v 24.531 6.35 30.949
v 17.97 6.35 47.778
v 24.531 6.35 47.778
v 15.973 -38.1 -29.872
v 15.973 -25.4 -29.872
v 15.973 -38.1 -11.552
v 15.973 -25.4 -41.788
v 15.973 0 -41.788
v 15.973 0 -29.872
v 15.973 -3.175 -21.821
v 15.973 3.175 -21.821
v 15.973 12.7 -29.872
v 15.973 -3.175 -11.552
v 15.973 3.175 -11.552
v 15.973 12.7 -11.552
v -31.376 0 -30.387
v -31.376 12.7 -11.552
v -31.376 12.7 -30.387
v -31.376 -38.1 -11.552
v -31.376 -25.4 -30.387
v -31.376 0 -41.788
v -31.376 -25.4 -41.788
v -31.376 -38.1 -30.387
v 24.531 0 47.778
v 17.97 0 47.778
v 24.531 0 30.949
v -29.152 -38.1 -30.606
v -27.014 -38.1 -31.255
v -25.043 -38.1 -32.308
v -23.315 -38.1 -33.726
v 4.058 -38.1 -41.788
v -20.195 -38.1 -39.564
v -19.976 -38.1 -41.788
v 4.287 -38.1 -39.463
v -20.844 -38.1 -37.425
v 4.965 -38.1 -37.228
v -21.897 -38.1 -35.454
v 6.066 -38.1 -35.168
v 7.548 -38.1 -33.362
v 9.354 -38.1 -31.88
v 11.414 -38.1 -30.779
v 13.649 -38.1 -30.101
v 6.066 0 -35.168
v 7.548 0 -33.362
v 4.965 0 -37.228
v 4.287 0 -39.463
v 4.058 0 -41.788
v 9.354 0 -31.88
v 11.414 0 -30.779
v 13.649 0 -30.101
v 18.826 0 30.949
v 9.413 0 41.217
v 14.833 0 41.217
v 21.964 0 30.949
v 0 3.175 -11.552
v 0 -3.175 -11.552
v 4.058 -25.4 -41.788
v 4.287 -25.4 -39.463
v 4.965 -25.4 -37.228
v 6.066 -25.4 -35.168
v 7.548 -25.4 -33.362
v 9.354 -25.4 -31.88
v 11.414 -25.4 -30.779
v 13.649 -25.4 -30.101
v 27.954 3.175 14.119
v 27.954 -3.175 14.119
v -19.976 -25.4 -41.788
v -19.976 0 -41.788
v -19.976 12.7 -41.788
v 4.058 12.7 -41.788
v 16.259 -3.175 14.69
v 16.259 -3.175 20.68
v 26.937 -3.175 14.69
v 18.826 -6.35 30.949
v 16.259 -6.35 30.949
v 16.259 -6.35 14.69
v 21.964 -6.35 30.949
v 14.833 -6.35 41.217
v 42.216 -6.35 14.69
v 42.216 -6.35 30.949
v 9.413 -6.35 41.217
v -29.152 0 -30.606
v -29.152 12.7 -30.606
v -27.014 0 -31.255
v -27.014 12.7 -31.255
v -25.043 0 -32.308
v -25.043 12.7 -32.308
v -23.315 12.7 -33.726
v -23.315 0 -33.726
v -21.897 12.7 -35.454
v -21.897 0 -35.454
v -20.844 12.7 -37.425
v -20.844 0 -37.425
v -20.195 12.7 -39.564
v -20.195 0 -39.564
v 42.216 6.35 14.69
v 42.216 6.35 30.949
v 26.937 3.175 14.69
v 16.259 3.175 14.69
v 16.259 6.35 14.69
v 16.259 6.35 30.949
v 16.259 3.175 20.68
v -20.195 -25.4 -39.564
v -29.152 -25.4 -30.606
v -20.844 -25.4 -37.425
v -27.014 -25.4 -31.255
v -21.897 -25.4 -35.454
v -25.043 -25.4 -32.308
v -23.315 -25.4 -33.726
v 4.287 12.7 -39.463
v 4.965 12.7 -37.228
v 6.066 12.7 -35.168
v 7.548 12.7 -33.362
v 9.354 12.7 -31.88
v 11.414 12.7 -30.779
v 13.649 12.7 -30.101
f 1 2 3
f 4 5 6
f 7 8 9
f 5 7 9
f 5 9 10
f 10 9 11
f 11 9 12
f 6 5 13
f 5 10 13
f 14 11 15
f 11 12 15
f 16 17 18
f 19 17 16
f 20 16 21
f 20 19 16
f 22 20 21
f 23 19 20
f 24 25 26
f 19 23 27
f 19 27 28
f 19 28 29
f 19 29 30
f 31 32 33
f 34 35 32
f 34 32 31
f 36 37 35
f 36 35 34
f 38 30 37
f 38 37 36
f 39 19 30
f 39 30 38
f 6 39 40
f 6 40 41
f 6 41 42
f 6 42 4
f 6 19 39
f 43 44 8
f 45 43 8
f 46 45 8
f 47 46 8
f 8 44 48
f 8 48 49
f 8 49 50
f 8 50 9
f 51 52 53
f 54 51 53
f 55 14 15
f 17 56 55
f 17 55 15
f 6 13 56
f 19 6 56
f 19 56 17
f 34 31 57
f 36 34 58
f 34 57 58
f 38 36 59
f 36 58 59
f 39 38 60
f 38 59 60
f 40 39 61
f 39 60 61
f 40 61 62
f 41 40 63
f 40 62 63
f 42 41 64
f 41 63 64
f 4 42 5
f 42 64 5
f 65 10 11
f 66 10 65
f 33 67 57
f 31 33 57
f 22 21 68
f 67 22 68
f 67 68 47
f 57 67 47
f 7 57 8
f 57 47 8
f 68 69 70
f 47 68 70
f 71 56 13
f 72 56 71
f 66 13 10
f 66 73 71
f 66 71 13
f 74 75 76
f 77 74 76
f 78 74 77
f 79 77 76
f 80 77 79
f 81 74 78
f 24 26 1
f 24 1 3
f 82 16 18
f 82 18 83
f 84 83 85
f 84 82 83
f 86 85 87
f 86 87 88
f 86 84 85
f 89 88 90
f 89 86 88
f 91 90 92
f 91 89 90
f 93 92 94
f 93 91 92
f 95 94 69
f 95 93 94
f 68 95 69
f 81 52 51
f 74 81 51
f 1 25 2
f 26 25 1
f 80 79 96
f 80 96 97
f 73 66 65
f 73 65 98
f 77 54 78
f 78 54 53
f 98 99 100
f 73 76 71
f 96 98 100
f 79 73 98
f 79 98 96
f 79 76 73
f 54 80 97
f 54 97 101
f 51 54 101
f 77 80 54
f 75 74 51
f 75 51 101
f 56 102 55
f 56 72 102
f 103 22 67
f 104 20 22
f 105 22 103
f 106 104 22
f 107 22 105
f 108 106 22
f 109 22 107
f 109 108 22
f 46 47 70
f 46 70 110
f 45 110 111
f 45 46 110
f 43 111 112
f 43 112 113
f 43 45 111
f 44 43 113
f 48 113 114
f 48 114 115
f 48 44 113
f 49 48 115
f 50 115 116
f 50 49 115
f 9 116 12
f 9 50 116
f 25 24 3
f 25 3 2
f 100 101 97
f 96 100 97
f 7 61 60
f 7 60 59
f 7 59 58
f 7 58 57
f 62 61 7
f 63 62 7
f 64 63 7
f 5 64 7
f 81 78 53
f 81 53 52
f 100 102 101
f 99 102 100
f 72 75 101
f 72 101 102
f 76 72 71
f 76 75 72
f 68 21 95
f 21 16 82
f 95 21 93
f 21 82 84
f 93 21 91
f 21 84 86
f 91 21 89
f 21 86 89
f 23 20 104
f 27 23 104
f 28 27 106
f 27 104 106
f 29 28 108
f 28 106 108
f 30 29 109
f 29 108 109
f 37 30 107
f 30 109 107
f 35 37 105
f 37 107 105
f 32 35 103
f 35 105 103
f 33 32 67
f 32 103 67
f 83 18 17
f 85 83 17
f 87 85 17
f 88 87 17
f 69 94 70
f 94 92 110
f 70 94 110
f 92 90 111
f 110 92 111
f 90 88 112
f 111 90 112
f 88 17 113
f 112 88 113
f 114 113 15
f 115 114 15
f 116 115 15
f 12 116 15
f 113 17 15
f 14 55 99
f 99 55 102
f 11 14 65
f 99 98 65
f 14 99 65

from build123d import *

# Parameters (mm, degrees)
F1_DEPTH = 12.7
F2_DEPTH = 3.175
F3_DEPTH = 6.35
F4_DEPTH = 6.35
F5_DEPTH = 6.35
F6_DEPTH = 25.4


with BuildPart() as f1:
    # F0 (on Front) → F1 (new body, symmetric)
    with BuildSketch(Plane.XZ):
        with BuildLine():
            Line((0, -11.5522462875), (-31.3764698803, -11.5522462875))
            Line((-31.3764698803, -11.5522462875), (-31.3764698803, -30.3869788403))
            ThreePointArc((-31.3764698803, -30.3869788403), (-23.3149039278, -33.7261887918), (-19.9756939763, -41.7877547443))
            Line((-19.9756939763, -41.7877547443), (4.0580634455, -41.7877547443))
            ThreePointArc((4.0580634455, -41.7877547443), (7.5480071851, -33.3622852363), (15.973476693, -29.8723414968))
            Line((15.973476693, -29.8723414968), (15.973476693, -21.820910275))
            Line((15.973476693, -21.820910275), (15.973476693, -11.5522462875))
            Line((15.973476693, -11.5522462875), (0, -11.5522462875))
        make_face()
    extrude(amount=F1_DEPTH, both=True)

    # F0 (on Front) → F2 (join, symmetric)
    with BuildSketch(Plane.XZ):
        Polygon((16.2587165833, 20.6799469888), (0, -11.5522462875), (15.973476693, -11.5522462875), (15.973476693, -21.820910275), align=None)
        Polygon((16.2587165833, 14.6898925304), (16.2587165833, 20.6799469888), (15.973476693, -21.820910275), (27.9535800219, 14.11941275), (26.9366379736, 14.6898925304), align=None)
    extrude(amount=F2_DEPTH, both=True)

    # F0 (on Front) → F3 (join, symmetric)
    with BuildSketch(Plane.XZ):
        Polygon((16.2587165833, 30.9486091137), (16.2587165833, 20.6799469888), (26.9366379736, 14.6898925304), (42.2156155109, 14.6898925304), (42.2156155109, 30.9486091137), (24.5306938887, 30.9486091137), (21.9635292888, 30.9486091137), (18.8258830458, 30.9486091137), align=None)
        Polygon((26.9366379736, 14.6898925304), (16.2587165833, 20.6799469888), (16.2587165833, 14.6898925304), align=None)
    extrude(amount=F3_DEPTH, both=True)

    # F0 (on Front) → F4 (join, through all)
    with BuildSketch(Plane.XZ):
        Polygon((9.4129433855, 41.2172712386), (18.8258830458, 30.9486091137), (21.9635292888, 30.9486091137), (14.8325143382, 41.2172712386), align=None)
    extrude(amount=F4_DEPTH)

    # F0 (on Front) + F1_face (on face) → F6 (join)
    with BuildSketch(Plane.XZ):
        with BuildLine():
            ThreePointArc((15.973476693, -29.8723414968), (7.5480071851, -33.3622852363), (4.0580634455, -41.7877547443))
            Line((4.0580634455, -41.7877547443), (15.973476693, -41.7877547443))
            Line((15.973476693, -41.7877547443), (15.973476693, -29.8723414968))
        make_face()
        with BuildLine():
            ThreePointArc((-19.9756939763, -41.7877547443), (-23.3149039278, -33.7261887918), (-31.3764698803, -30.3869788403))
            Line((-31.3764698803, -30.3869788403), (-31.3764698803, -41.7877547443))
            Line((-31.3764698803, -41.7877547443), (-19.9756939763, -41.7877547443))
        make_face()
    with BuildSketch(Plane(origin=(-7.8272407541, -12.7, -24.8874984342), x_dir=(1, 0, 0), z_dir=(0, -1, 0))):
        with BuildLine():
            Line((23.8007174471, 13.3352521467), (-23.5492291262, 13.3352521467))
            Line((-23.5492291262, 13.3352521467), (-23.5492291262, -5.4994804061))
            ThreePointArc((-23.5492291262, -5.4994804061), (-15.4876631737, -8.8386903576), (-12.1484532222, -16.9002563101))
            Line((-12.1484532222, -16.9002563101), (11.8853041996, -16.9002563101))
            ThreePointArc((11.8853041996, -16.9002563101), (15.3752479392, -8.4747868021), (23.8007174471, -4.9848430626))
            Line((23.8007174471, -4.9848430626), (23.8007174471, 13.3352521467))
        make_face()
    extrude(amount=F6_DEPTH)


with BuildPart() as f5:
    # F0 (on Front) → F5 (new body, through all)
    with BuildSketch(Plane.XZ):
        Polygon((17.9701596498, 47.7778092027), (24.5306938887, 30.9486091137), (24.5306938887, 47.7778092027), align=None)
    extrude(amount=-F5_DEPTH)


solid = Compound([f1.part, f5.part])
